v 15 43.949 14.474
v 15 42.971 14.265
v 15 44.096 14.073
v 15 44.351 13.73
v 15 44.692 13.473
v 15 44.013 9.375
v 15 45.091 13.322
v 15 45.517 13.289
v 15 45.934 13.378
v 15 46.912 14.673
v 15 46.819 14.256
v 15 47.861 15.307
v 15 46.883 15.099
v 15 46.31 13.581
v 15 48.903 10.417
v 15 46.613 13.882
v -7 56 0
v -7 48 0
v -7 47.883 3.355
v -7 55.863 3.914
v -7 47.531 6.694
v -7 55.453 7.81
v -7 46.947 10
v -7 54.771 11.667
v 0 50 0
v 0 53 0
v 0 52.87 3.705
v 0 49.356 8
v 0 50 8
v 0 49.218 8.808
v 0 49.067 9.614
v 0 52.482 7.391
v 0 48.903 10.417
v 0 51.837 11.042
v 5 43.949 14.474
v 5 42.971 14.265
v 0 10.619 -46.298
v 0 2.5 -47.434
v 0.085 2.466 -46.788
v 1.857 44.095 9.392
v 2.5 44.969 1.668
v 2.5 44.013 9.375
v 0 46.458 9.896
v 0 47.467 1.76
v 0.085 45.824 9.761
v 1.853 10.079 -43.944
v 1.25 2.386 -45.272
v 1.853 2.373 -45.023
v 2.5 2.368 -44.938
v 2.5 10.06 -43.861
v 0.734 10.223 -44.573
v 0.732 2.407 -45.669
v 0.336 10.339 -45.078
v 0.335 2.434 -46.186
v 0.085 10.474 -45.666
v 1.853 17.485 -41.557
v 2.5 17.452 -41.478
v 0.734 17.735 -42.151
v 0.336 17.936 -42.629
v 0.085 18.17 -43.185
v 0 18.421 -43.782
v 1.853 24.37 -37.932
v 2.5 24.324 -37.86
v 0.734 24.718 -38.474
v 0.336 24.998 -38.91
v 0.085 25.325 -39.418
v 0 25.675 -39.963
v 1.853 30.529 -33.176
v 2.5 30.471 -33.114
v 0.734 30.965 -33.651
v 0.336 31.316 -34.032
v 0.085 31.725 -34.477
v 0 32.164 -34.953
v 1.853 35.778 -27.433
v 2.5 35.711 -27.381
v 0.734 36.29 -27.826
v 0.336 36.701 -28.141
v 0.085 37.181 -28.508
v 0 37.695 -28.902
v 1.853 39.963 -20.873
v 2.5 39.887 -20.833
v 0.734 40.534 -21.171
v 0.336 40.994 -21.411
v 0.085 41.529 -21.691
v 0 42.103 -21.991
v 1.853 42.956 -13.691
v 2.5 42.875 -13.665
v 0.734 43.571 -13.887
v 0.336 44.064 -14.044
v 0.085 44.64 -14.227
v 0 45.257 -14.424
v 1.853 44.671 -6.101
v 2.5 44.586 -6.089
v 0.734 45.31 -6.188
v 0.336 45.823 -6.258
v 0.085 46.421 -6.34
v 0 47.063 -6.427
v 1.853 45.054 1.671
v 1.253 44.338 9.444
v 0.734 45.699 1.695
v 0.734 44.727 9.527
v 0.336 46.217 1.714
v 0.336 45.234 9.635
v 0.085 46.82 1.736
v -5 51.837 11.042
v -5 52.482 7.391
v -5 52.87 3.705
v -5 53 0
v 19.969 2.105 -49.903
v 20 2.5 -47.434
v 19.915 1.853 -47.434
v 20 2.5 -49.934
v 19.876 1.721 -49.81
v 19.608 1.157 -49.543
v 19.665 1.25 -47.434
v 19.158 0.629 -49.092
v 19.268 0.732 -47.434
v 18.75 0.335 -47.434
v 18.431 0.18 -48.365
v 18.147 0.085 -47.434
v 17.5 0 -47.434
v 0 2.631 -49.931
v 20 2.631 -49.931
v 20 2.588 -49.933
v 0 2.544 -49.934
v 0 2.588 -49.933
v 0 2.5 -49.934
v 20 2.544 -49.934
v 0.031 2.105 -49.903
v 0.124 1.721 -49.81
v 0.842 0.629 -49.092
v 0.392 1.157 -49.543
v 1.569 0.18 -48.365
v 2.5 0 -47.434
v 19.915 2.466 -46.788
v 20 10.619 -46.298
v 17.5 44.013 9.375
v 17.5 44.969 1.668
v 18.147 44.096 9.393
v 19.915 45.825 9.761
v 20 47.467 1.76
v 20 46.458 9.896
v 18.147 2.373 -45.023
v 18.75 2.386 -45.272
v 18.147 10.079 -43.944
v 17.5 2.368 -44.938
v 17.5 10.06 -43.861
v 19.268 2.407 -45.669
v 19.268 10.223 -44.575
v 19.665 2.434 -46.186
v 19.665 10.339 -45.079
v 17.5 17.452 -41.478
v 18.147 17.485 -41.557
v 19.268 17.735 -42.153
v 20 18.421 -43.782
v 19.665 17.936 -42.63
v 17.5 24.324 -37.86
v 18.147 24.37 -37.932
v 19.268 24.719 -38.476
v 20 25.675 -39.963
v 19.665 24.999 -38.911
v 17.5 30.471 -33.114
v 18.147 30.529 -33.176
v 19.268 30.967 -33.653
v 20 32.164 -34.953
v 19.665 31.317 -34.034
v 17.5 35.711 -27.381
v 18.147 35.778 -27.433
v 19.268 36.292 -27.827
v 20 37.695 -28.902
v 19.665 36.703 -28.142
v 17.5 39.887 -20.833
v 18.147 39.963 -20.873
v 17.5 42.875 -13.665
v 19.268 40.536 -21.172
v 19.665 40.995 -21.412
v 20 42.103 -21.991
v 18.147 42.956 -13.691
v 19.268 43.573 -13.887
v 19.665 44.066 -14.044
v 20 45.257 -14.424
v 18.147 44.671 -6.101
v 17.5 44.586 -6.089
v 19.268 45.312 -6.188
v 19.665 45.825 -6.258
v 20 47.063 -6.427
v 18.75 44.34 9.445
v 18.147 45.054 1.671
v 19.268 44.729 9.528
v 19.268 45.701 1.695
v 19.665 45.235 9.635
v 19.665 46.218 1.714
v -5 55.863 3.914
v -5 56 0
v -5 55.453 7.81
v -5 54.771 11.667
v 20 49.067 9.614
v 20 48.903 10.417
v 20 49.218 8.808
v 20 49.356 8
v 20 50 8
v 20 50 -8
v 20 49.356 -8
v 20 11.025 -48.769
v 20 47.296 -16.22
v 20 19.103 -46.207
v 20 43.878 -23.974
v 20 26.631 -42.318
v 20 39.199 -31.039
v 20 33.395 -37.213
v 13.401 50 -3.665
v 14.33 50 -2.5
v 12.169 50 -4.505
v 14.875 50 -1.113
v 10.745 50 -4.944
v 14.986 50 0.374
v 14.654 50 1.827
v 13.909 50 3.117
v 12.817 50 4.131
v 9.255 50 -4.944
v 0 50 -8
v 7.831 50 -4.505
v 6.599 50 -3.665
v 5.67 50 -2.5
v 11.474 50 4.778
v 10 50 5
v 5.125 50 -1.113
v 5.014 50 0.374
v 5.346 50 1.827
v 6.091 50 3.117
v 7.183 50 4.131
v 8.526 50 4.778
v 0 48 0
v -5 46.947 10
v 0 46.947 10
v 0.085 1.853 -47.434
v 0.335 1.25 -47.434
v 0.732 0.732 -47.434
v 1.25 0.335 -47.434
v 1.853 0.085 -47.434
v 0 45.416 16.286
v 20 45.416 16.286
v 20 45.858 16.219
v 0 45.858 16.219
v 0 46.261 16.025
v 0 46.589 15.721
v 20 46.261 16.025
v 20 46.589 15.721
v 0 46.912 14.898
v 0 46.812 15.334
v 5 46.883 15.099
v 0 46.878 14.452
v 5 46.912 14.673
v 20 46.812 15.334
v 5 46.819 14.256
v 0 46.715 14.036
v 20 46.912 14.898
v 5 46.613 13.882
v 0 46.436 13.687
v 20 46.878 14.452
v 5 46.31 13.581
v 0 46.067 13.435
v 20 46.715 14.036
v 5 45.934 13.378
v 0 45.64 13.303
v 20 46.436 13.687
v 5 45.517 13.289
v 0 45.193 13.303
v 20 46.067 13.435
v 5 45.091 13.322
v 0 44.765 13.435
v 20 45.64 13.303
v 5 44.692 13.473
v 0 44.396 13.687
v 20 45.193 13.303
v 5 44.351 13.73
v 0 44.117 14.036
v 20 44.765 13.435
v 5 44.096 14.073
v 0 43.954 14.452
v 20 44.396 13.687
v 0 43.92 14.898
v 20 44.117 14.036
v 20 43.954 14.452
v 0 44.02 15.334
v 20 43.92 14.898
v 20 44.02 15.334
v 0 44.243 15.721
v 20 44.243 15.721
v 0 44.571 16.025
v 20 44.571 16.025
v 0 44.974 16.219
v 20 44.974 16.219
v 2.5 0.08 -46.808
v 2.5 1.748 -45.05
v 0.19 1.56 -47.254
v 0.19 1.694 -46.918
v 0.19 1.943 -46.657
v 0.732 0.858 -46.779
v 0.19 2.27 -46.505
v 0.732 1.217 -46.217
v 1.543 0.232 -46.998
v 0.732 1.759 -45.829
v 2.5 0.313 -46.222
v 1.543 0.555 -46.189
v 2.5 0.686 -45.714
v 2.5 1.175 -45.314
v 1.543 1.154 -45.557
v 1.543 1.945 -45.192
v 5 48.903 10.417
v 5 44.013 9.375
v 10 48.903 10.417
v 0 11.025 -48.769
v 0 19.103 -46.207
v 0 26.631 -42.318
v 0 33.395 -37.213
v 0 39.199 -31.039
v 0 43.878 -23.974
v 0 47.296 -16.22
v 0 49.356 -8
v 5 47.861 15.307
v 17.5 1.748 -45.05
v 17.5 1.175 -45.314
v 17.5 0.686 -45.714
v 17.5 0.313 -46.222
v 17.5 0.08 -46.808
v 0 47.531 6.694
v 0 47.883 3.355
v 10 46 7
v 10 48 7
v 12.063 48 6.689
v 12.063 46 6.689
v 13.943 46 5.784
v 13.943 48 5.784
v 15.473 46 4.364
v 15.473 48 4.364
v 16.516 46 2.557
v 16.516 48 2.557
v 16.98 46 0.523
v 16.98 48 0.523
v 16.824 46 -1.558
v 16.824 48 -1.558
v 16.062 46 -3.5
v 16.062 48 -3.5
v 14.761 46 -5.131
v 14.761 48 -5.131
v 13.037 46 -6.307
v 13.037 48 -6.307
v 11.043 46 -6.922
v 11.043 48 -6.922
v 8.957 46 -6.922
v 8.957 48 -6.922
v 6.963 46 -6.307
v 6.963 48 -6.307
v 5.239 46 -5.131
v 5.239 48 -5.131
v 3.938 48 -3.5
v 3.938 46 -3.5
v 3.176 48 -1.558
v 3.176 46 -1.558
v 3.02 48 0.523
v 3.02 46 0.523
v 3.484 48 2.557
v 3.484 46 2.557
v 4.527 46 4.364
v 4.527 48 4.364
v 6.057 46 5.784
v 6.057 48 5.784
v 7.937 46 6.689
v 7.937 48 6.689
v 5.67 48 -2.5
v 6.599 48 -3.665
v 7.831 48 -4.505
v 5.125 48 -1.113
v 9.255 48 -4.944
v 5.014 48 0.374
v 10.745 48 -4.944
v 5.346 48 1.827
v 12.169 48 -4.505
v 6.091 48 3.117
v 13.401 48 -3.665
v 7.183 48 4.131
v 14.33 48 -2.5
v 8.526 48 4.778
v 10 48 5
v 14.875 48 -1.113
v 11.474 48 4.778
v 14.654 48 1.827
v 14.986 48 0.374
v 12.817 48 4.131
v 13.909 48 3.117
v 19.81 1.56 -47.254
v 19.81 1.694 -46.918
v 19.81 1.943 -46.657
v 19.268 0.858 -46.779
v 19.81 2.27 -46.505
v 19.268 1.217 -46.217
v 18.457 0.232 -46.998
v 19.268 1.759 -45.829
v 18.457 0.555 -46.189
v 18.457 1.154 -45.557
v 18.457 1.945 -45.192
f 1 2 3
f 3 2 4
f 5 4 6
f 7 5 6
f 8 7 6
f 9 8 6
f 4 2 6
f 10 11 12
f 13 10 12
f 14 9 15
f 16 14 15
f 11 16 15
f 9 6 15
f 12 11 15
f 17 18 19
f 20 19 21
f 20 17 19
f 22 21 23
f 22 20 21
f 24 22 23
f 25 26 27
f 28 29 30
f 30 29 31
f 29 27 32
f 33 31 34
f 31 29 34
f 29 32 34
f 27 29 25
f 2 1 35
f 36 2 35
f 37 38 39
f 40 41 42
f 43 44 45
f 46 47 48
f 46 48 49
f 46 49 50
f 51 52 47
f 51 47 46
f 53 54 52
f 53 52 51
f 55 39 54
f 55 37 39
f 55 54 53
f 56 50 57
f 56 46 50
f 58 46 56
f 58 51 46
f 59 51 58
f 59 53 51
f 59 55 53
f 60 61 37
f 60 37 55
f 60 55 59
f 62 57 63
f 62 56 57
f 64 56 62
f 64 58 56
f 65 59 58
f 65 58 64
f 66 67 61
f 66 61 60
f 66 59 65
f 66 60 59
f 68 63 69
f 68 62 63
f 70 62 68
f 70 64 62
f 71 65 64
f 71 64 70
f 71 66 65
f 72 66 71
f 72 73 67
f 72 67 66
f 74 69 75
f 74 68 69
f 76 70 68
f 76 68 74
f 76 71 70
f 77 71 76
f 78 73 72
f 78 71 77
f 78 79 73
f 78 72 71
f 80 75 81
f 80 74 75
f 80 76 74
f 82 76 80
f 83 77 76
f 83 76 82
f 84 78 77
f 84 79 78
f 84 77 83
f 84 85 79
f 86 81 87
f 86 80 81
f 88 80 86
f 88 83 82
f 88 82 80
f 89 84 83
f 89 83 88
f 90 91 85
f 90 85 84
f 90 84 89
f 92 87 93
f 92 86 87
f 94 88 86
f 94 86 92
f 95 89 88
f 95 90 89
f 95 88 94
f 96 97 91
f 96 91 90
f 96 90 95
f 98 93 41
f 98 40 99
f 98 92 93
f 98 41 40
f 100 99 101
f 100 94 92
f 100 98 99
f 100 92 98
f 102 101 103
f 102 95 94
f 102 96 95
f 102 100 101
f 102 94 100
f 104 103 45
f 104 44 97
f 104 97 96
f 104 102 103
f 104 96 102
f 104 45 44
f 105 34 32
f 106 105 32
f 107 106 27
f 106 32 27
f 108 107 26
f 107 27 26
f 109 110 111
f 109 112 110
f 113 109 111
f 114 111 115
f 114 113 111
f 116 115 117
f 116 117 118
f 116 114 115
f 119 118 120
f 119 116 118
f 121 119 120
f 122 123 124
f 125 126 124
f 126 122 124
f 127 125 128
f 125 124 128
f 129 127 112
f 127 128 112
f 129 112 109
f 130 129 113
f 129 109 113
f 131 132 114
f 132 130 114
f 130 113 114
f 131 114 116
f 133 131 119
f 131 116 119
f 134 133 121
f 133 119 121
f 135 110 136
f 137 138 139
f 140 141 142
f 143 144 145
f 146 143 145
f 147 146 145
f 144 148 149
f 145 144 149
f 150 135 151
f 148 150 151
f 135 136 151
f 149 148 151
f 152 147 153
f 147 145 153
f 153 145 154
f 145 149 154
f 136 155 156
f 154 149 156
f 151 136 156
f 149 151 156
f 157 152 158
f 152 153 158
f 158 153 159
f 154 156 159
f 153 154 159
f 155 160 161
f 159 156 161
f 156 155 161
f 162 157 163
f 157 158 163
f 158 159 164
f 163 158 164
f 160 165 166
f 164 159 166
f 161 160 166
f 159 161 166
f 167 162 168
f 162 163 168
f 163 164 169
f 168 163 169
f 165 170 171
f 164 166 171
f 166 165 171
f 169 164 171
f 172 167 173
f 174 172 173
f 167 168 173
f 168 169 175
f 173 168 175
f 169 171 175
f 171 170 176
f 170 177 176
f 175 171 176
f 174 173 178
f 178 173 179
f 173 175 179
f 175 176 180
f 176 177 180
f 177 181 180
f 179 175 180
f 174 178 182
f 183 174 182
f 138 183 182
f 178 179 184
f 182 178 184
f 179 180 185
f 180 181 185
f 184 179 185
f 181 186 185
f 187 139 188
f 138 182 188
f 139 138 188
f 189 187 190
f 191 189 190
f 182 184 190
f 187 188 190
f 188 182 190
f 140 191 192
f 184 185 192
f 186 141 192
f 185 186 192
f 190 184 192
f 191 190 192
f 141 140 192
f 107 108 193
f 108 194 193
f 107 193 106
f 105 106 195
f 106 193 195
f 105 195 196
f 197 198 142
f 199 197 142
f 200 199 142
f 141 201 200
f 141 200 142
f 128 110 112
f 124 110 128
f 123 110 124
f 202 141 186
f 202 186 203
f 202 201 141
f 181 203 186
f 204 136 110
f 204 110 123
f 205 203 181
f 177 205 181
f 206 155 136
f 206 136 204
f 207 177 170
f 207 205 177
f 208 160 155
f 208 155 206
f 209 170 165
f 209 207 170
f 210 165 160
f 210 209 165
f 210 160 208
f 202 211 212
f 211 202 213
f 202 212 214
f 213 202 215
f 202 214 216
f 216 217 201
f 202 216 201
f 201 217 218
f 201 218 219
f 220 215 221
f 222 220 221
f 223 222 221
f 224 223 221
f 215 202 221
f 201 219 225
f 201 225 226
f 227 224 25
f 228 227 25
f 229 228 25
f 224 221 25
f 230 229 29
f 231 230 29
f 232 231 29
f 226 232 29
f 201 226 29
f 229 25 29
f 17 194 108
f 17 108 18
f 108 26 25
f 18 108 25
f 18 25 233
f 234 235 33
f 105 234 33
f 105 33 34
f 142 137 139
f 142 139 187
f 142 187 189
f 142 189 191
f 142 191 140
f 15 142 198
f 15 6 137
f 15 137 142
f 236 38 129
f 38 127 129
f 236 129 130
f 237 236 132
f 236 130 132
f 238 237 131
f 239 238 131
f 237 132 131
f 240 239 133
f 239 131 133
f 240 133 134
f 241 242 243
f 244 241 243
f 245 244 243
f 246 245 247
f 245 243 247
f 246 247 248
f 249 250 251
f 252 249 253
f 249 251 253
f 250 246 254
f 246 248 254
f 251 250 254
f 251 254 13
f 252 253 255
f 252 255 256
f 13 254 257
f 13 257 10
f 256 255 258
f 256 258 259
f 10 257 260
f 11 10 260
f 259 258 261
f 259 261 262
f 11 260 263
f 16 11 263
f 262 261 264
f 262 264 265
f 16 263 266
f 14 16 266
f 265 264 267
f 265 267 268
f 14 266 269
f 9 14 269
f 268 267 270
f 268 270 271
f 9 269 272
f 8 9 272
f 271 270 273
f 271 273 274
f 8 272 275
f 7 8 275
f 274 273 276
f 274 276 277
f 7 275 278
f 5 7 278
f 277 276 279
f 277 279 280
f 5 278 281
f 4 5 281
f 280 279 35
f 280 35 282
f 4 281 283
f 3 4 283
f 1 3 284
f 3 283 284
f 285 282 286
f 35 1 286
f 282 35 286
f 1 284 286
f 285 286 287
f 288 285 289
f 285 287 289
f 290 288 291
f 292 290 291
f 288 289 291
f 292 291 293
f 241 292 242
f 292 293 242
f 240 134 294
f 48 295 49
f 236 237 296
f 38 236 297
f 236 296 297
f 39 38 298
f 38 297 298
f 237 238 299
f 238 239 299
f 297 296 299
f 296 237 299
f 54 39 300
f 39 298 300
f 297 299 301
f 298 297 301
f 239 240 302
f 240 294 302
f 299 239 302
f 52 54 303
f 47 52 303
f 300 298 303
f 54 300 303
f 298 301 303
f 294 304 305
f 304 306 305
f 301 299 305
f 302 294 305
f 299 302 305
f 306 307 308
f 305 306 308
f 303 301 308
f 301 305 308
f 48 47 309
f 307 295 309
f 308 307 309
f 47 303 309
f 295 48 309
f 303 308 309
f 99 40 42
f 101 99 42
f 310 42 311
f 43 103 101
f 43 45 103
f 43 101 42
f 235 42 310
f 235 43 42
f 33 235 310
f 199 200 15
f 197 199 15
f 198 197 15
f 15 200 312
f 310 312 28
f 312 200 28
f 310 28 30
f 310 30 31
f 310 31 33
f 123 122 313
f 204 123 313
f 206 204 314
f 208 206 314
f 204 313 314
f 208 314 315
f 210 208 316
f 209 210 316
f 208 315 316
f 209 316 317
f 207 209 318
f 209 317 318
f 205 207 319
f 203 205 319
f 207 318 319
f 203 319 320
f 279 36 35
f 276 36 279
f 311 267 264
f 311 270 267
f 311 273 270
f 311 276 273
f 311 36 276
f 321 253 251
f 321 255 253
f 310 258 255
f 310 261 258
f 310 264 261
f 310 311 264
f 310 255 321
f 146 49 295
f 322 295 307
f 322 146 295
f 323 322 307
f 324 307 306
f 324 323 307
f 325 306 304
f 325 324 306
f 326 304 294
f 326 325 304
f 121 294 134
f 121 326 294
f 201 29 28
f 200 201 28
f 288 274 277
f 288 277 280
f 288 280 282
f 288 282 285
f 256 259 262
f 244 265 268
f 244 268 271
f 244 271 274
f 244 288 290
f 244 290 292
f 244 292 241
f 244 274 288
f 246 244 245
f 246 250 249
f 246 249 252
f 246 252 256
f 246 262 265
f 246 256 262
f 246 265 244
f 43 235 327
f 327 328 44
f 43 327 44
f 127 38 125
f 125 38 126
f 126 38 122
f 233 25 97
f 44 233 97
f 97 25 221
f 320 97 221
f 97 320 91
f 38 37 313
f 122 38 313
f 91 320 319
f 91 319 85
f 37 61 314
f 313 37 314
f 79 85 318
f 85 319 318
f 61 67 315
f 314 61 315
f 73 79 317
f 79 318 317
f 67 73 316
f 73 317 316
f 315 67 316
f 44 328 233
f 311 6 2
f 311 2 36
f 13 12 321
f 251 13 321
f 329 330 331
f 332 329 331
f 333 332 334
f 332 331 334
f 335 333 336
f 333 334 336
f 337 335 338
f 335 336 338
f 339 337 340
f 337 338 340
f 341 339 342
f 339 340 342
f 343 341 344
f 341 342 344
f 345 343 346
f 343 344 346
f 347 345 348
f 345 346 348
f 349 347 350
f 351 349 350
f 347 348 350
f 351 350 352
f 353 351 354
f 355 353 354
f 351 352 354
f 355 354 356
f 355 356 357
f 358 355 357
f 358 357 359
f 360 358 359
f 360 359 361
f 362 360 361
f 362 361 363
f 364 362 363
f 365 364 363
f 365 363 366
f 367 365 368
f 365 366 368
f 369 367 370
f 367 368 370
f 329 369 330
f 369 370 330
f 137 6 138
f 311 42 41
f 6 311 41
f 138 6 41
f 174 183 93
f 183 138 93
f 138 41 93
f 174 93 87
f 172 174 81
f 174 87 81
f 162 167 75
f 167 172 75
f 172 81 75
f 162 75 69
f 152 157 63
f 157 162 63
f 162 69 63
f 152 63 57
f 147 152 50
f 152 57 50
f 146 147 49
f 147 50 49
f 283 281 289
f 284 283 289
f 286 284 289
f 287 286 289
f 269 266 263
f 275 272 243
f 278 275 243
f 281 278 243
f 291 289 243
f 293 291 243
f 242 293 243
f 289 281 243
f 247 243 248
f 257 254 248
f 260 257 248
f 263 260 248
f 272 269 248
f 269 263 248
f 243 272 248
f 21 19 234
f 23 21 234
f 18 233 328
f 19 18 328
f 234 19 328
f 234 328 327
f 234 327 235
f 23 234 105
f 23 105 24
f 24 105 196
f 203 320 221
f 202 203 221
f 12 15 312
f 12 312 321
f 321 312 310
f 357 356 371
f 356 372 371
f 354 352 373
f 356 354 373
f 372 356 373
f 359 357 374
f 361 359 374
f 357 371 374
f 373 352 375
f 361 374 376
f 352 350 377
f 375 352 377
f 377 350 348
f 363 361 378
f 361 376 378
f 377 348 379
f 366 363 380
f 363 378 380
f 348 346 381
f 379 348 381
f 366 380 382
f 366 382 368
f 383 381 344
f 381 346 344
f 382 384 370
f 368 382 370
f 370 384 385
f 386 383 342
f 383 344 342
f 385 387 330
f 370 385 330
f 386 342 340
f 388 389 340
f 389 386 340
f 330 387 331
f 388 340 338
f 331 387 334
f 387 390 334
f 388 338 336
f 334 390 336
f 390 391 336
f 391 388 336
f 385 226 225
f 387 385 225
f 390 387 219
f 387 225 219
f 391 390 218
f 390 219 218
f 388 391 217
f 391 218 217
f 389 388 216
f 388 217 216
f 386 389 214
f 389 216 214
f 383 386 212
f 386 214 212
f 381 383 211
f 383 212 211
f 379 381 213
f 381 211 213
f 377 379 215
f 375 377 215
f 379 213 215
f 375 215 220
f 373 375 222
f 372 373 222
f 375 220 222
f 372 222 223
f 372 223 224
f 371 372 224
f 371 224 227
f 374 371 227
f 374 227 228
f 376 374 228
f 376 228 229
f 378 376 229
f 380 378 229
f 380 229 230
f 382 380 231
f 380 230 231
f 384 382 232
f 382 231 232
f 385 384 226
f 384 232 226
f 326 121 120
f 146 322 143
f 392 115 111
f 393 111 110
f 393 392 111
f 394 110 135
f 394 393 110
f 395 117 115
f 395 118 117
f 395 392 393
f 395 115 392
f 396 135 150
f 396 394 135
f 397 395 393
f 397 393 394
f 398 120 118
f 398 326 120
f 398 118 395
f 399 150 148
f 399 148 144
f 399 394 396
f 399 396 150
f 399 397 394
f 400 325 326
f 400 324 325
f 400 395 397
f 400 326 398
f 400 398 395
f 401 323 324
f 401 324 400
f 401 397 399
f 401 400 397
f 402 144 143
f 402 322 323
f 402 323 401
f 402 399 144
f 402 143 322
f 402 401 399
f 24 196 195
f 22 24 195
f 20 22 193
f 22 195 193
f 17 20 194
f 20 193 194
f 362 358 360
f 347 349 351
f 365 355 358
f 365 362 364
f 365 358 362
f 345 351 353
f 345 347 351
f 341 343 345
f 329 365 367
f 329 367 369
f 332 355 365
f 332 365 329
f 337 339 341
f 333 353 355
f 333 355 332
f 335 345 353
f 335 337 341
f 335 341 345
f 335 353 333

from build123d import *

# Parameters (mm, degrees)
BOSS_EXTRUDE1_DEPTH = 20
BOSS_EXTRUDE2_DEPTH = 20
SKETCH4_R           = 5
CUT_EXTRUDE1_DEPTH  = 2
SKETCH5_R           = 7
CUT_EXTRUDE2_DEPTH  = 2
BOSS_EXTRUDE5_DEPTH = 5
BOSS_EXTRUDE6_DEPTH = 2
SKETCH11_W          = 20
SKETCH11_H          = 5
SKETCH12_W          = 5
SKETCH12_H          = 5
BOSS_EXTRUDE7_DEPTH = 5
SKETCH13_R          = 1.5
BOSS_EXTRUDE8_DEPTH = 5
FILLET1_R           = 2.5


with BuildPart() as part:
    # Sketch2 → Boss-Extrude1 (new body)
    with BuildSketch(Plane(origin=(0, 0, 0), x_dir=(0, 0, -1), z_dir=(1, 0, 0))):
        with BuildLine():
            Line((-50, 0), (-45, 0))
            ThreePointArc((-45, 0), (0, 45), (45, 0))
            Line((45, 0), (50, 0))
            ThreePointArc((50, 0), (0, 50), (-50, 0))
        make_face()
    extrude(amount=BOSS_EXTRUDE1_DEPTH)

    # Sketch3 → Boss-Extrude2 (add)
    with BuildSketch(Plane(origin=(0, 0, 0), x_dir=(0, 0, -1), z_dir=(1, 0, 0))):
        Polygon((0, 45), (8, 45), (8, 50), (-8, 50), (-8, 45), align=None)
    extrude(amount=BOSS_EXTRUDE2_DEPTH)

    # Sketch4 → Cut-Extrude1 (cut)
    with BuildSketch(Plane(origin=(0, 50, 0), x_dir=(1, 0, 0), z_dir=(0, 1, 0))):
        with Locations(Location((10, 0, 0), (0, 0, 270))):
            Circle(SKETCH4_R)
    extrude(amount=-CUT_EXTRUDE1_DEPTH, mode=Mode.SUBTRACT)

    # Sketch5 → Cut-Extrude2 (cut)
    with BuildSketch(Plane(origin=(0, 48, 0), x_dir=(1, 0, 0), z_dir=(0, 1, 0))):
        with Locations(Location((10, 0, 0), (0, 0, 270))):
            Circle(SKETCH5_R)
    extrude(amount=-CUT_EXTRUDE2_DEPTH, mode=Mode.SUBTRACT)

    # Sketch9 → Boss-Extrude5 (add)
    with BuildSketch(Plane.ZY):
        with BuildLine():
            Line((10, 46.946778377), (11.041666667, 51.837067792))
            ThreePointArc((11.041666667, 51.837067792), (5.551369518, 52.708465131), (0, 53))
            Line((0, 53), (0, 48))
            ThreePointArc((0, 48), (5.027655412, 47.735968421), (10, 46.946778377))
        make_face()
    extrude(amount=BOSS_EXTRUDE5_DEPTH)

    # Sketch10 → Boss-Extrude6 (add)
    with BuildSketch(Plane.ZY.offset(5)):
        with BuildLine():
            Line((10, 46.946778377), (11.666666667, 54.77124144))
            ThreePointArc((11.666666667, 54.77124144), (5.865597981, 55.691963157), (0, 56))
            Line((0, 56), (0, 48))
            ThreePointArc((0, 48), (5.027655412, 47.735968421), (10, 46.946778377))
        make_face()
    extrude(amount=BOSS_EXTRUDE6_DEPTH)

    # Cut-Sweep2: sweep along a curve in space
    with BuildLine() as cut_sweep2_path:
        ThreePointArc((0, 48.902894143, 10.416666667), (0, 31.45764348, 38.864079388), (0, 0, 50))
    # Sketch11 → Cut-Sweep2 (sweep, cut)
    with BuildSketch(Plane.XZ):
        with Locations((10, 47.5)):
            Rectangle(SKETCH11_W, SKETCH11_H)
    sweep(path=cut_sweep2_path.line, mode=Mode.SUBTRACT)

    # Sketch12 → Boss-Extrude7 (add)
    with BuildSketch(Plane(origin=(0, 0, 0), x_dir=(1, 0, 0), z_dir=(0, -0.20833333333333337, 0.9780578828587918))):
        with Locations((7.5, 47.5)):
            Rectangle(SKETCH12_W, SKETCH12_H)
    boss_extrude7 = extrude(amount=BOSS_EXTRUDE7_DEPTH)

    # Sketch13 → Boss-Extrude8 (add, symmetric)
    with BuildSketch(Plane.ZY.offset(-5)):
        with Locations((14.786122748, 45.416082769)):
            Circle(SKETCH13_R)
    boss_extrude8 = extrude(amount=BOSS_EXTRUDE8_DEPTH, both=True)

    # Mirror1: Boss-Extrude7, Boss-Extrude8 across plane
    add(boss_extrude7.mirror(Plane(origin=(10, 42.970938062, 14.265289414), x_dir=(0, 0, 1), z_dir=(-1, 0, 0))))
    add(boss_extrude8.mirror(Plane(origin=(10, 42.970938062, 14.265289414), x_dir=(0, 0, 1), z_dir=(-1, 0, 0))))

    # Fillet1
    fillet1_edges = [part.edges().sort_by_distance(p)[0] for p in [
        (10, 0, -45),
        (20, 0, -47.5),
        (10, 0, -50),
        (0, 0, -47.5),
        (0, 34.977671449, -28.311879132),
        (20, 34.977671449, -28.311879132),
    ]]
    fillet(fillet1_edges, radius=FILLET1_R - 0.0001)  # a hair under: the kernel refuses the full size


solid = part.part
